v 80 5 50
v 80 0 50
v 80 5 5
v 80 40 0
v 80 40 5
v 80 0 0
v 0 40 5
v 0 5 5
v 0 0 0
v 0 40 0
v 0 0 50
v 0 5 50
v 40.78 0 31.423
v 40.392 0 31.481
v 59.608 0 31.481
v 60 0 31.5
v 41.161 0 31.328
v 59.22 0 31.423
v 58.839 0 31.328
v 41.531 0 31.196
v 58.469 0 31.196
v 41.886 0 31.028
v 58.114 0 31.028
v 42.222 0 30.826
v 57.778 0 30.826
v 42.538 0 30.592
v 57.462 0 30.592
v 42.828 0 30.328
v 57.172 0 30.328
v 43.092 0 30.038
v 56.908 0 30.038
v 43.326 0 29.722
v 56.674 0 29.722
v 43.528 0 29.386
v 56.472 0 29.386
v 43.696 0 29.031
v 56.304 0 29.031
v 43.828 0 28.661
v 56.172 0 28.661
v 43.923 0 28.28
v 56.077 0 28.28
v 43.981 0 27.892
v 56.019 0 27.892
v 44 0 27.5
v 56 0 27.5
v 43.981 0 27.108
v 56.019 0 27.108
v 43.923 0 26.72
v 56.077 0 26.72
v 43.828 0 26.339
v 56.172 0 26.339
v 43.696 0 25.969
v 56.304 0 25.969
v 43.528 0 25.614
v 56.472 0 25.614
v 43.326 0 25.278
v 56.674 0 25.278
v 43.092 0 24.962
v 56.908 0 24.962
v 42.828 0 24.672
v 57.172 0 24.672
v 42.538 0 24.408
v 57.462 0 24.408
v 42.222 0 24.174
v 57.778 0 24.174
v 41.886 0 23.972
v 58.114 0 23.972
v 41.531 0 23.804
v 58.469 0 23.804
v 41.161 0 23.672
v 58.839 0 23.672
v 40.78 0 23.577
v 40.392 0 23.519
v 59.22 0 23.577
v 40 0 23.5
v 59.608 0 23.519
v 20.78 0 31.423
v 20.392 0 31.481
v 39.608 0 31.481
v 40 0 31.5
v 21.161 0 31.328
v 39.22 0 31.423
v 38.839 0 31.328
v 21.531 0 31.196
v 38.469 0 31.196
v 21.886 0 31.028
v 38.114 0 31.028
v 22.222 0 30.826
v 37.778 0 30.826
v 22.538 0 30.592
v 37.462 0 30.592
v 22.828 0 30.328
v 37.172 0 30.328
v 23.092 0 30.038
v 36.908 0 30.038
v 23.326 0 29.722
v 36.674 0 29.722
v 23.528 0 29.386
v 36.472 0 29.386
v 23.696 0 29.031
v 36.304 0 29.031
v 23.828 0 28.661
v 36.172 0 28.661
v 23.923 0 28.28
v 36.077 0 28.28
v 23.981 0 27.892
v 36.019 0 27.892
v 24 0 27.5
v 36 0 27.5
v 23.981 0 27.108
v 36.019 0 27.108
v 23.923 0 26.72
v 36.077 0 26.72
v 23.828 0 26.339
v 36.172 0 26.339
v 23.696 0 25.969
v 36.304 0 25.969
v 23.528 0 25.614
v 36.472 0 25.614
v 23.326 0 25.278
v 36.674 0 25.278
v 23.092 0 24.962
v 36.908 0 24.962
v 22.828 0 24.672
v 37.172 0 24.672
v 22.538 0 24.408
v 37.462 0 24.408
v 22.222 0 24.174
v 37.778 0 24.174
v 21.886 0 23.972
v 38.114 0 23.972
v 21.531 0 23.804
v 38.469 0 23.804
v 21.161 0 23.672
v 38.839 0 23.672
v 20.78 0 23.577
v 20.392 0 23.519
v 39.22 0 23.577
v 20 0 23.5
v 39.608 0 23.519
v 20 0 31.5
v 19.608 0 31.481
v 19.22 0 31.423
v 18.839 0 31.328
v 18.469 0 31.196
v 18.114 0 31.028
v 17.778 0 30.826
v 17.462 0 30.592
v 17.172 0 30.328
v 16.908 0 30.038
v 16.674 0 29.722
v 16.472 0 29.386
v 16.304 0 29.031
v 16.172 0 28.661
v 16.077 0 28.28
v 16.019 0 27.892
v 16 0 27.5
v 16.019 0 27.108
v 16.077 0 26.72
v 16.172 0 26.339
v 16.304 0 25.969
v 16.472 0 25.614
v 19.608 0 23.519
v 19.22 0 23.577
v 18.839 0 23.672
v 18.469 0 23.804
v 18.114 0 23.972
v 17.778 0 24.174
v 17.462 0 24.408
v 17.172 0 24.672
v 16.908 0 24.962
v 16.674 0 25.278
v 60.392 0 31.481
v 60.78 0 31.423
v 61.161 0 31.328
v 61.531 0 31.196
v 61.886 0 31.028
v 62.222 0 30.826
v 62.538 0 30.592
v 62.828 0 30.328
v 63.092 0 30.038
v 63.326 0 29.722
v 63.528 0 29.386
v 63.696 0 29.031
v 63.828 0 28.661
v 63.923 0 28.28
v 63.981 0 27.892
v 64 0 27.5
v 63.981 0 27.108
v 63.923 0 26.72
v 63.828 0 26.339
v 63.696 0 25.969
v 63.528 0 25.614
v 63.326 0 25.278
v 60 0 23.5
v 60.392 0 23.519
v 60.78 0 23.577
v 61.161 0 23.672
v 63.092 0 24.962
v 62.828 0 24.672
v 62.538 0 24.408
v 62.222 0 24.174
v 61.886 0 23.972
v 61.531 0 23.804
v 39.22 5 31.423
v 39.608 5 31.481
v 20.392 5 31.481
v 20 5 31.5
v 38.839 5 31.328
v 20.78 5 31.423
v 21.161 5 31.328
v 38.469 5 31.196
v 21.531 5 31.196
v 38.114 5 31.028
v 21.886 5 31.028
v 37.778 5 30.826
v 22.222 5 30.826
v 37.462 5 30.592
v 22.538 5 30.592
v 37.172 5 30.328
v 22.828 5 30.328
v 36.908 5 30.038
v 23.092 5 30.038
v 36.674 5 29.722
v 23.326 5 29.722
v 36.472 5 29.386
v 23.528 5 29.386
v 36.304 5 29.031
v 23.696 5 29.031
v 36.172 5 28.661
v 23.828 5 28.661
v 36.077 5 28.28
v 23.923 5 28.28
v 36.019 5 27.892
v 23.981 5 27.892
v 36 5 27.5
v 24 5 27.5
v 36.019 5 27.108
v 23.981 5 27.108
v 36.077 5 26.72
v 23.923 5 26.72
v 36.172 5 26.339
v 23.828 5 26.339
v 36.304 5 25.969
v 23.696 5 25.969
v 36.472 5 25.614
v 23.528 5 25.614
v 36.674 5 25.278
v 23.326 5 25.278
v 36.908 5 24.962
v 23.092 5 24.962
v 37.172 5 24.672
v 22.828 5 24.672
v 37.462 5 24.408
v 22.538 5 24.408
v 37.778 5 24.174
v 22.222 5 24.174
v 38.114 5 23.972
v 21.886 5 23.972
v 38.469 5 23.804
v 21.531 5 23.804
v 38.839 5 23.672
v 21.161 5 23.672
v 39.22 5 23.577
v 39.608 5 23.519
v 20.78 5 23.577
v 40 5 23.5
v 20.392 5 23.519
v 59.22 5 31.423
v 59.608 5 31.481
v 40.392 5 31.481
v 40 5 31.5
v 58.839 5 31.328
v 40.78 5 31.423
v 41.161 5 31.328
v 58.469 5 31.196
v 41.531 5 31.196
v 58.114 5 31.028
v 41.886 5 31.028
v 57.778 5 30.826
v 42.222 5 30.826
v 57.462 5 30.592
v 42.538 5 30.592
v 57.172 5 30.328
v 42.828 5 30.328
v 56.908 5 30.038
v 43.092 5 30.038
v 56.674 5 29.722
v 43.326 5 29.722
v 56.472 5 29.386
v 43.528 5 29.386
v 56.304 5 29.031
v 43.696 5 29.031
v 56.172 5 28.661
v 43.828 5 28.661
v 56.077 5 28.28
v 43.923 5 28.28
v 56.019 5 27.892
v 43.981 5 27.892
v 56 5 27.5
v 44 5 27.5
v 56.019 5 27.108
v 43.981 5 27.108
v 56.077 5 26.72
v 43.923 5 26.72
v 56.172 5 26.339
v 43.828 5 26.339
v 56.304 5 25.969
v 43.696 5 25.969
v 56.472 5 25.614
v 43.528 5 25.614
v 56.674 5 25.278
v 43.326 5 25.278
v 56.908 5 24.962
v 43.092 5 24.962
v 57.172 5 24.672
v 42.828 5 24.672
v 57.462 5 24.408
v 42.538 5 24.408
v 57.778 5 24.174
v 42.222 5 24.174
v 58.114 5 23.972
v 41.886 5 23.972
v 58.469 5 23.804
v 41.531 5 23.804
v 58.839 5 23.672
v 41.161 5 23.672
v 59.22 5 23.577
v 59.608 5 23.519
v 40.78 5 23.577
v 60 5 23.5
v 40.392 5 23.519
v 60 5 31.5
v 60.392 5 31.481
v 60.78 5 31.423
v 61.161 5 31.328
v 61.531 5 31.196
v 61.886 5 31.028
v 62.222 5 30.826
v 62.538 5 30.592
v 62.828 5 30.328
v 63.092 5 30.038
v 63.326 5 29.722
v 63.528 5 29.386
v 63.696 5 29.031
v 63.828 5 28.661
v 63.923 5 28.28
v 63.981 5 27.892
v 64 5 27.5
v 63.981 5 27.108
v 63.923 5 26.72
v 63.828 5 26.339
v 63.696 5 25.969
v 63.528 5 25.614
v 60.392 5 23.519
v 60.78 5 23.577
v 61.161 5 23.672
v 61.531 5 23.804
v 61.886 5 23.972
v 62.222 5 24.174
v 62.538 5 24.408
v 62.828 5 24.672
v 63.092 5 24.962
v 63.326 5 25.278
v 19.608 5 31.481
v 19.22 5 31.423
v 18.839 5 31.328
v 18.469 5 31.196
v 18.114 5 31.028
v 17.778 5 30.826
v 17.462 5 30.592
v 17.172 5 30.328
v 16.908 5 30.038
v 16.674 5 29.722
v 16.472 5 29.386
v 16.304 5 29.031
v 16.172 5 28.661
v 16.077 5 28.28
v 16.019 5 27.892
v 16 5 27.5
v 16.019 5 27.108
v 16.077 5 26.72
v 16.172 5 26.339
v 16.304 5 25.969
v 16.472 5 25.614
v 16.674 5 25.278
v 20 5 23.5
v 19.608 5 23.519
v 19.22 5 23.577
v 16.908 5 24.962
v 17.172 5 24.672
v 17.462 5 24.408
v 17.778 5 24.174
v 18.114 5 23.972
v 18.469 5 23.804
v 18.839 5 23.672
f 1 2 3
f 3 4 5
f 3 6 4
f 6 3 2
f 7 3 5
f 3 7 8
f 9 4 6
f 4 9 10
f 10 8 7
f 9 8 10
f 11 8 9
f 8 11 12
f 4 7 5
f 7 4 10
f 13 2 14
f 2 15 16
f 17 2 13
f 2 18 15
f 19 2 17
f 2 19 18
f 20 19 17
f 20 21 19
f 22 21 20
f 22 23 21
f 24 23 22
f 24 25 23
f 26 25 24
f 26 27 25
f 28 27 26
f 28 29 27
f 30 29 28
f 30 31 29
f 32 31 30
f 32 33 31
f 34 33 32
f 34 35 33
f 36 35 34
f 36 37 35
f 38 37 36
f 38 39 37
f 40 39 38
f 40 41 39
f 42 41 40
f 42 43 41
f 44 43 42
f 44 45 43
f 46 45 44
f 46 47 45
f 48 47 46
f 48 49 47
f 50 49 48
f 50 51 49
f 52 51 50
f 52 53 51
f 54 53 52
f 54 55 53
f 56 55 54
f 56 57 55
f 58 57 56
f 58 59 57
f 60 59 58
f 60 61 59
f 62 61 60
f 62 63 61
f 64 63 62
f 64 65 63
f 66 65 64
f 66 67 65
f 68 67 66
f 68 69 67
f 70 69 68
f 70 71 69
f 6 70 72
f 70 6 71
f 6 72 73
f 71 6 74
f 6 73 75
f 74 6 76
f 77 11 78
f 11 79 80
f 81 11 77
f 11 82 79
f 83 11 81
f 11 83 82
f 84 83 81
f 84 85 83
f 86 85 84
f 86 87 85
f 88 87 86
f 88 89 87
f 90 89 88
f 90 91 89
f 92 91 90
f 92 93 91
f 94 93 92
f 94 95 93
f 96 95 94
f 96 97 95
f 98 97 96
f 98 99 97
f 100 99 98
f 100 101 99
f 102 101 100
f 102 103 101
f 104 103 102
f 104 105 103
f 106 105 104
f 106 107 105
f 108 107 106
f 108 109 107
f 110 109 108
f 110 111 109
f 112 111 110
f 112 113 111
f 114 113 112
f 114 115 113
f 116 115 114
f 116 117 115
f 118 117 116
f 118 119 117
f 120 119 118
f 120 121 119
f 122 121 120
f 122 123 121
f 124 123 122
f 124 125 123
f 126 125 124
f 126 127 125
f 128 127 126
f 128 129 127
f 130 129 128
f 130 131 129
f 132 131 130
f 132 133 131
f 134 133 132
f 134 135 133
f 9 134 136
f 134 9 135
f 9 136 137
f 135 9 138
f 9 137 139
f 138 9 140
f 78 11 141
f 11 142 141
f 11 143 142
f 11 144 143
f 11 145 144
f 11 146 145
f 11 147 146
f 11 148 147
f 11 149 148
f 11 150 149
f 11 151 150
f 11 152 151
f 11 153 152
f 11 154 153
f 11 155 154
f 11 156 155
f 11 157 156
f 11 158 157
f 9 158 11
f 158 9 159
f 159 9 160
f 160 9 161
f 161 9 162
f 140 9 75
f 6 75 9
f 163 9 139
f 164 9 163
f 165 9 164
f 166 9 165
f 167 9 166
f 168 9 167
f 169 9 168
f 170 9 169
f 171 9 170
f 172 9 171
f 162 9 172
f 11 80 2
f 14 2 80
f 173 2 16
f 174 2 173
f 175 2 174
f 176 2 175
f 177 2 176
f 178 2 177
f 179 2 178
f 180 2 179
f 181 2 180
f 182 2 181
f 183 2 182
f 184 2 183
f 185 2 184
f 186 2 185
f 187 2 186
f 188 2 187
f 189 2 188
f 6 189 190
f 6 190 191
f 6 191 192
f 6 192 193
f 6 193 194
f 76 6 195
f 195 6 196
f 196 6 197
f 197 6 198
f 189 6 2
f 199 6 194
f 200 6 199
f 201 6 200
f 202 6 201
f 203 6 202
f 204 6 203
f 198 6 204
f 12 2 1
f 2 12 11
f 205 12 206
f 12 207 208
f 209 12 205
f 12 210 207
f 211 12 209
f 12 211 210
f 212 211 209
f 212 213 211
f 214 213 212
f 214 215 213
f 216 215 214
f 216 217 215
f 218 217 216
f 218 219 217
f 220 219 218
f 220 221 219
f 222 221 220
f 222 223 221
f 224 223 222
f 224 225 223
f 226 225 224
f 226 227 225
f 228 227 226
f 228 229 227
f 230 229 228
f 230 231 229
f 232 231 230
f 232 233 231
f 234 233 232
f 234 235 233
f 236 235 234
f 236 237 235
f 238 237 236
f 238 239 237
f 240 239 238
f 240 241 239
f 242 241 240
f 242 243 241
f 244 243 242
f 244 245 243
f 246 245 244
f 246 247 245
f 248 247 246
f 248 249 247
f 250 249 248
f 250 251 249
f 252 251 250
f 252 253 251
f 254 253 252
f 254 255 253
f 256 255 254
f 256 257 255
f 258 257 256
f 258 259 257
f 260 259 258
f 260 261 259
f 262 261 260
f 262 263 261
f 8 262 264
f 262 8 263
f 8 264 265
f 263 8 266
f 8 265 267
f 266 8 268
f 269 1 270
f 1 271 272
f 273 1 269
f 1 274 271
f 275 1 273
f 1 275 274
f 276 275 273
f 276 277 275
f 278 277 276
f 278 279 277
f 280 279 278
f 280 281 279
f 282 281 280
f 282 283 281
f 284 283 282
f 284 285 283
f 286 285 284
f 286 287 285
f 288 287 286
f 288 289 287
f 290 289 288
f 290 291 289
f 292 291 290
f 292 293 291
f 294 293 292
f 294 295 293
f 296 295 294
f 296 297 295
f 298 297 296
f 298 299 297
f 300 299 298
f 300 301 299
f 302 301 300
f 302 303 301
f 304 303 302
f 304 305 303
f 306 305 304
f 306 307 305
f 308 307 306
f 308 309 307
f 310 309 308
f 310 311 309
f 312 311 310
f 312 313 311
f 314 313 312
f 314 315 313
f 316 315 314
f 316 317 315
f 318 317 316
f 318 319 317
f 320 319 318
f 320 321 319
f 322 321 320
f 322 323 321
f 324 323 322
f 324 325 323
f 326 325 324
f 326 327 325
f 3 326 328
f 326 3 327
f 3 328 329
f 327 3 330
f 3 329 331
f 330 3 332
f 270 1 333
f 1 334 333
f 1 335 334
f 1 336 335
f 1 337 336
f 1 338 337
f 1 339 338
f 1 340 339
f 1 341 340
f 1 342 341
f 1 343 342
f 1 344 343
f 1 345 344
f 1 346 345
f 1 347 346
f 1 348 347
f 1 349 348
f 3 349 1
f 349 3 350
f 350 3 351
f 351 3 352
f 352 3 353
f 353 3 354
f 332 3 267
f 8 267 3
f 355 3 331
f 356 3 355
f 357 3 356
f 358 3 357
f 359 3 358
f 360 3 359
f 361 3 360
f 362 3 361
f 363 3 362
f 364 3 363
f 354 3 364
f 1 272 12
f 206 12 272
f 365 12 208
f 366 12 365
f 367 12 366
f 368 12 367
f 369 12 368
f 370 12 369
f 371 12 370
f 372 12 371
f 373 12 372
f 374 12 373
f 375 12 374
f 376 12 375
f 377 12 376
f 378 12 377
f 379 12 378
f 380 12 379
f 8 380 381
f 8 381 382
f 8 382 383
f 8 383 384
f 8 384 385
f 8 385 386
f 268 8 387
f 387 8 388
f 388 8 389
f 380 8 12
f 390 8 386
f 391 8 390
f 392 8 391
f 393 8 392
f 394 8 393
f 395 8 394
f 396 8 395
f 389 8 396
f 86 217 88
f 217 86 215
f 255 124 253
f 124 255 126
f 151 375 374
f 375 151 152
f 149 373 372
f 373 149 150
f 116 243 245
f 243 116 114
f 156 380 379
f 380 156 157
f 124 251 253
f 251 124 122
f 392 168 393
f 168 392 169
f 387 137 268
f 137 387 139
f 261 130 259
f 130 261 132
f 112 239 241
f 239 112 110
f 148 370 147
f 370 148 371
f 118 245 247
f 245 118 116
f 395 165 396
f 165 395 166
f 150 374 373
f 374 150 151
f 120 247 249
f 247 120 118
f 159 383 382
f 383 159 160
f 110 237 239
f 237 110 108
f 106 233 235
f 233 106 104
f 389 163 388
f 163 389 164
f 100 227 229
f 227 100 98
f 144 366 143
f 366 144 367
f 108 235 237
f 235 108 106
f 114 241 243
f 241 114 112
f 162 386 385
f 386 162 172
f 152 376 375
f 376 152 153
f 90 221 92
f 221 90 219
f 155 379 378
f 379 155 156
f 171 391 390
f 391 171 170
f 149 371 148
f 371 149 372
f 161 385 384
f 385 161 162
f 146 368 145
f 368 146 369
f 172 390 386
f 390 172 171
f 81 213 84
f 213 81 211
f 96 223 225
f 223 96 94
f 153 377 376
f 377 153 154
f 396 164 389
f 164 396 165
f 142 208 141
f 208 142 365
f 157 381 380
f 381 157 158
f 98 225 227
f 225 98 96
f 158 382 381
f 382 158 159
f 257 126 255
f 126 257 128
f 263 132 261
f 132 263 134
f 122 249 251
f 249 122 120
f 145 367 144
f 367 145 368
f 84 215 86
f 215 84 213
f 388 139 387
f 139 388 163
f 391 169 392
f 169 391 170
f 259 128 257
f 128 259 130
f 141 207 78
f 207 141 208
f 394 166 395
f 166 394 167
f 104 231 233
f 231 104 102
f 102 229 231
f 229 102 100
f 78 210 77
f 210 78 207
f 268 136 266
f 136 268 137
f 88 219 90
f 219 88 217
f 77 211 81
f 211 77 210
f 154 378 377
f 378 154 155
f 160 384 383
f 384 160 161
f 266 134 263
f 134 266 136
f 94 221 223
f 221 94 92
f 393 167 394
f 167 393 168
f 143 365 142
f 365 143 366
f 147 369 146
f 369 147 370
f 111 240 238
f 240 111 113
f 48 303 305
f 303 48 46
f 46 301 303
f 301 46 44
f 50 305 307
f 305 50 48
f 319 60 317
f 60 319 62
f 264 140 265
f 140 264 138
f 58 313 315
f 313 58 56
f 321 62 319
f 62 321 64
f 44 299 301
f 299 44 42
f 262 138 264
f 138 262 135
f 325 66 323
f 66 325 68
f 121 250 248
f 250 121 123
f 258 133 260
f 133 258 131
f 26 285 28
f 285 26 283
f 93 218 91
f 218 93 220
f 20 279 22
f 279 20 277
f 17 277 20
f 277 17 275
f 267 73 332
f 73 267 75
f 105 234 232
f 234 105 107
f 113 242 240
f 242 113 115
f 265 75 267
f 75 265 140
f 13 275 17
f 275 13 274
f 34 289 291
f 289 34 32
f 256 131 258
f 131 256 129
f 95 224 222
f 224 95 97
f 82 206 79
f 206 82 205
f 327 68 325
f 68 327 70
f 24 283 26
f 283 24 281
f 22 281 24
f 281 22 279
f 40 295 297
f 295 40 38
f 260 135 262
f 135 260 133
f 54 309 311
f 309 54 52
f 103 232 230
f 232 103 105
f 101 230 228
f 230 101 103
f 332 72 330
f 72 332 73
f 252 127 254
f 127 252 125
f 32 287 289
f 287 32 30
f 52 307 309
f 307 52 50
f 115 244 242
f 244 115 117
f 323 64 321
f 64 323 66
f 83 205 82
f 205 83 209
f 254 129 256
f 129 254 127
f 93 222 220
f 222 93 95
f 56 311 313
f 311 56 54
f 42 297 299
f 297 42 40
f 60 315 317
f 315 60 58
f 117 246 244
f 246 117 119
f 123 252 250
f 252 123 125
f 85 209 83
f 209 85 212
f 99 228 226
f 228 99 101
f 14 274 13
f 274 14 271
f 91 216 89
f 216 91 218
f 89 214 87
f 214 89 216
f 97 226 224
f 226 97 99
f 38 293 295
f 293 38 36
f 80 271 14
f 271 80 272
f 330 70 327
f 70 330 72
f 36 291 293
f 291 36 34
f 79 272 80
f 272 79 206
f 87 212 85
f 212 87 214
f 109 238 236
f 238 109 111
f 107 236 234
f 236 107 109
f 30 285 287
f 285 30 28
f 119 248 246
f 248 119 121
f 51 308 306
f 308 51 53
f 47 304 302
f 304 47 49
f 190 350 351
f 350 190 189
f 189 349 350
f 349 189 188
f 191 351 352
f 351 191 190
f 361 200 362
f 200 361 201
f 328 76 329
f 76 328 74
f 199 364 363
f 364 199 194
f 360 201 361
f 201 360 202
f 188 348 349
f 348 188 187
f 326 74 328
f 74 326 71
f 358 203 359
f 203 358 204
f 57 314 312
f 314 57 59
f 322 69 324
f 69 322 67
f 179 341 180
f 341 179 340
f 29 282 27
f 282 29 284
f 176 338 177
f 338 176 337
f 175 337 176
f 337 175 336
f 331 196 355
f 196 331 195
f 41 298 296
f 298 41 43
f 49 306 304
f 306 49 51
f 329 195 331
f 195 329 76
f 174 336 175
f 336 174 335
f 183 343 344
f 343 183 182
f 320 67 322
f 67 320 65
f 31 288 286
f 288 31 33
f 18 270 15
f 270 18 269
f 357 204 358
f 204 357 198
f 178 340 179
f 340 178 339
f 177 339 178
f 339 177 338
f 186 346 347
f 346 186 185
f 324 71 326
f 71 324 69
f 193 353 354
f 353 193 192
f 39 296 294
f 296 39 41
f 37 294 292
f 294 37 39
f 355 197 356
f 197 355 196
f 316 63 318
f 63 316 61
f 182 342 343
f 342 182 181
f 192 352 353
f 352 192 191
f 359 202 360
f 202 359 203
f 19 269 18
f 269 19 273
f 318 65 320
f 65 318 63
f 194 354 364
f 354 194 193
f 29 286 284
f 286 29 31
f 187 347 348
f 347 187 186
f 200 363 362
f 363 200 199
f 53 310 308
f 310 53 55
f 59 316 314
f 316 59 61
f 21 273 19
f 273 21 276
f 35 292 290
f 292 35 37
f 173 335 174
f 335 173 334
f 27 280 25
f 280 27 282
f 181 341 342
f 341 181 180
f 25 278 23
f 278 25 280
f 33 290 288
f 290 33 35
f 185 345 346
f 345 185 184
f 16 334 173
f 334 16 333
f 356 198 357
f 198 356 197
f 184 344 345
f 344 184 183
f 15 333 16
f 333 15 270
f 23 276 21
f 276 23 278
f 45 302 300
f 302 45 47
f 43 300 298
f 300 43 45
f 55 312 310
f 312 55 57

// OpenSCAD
// fixture: reviewed L-bracket for the 007 case (issue #81 EV-4).
// The notes say 'L angle bracket with three wall holes'; the ink shows two
// independent rectangles (one with 3 holes). This is the reviewed
// interpretation: base wall + upright wall with 3 through-holes, sized to
// the GT extents 80x40x50. Compared against the model's own archived
// plate scad through the SAME projection path the product used.
$fn = 64;
difference() {
  union() {
    cube([80, 40, 5]);                 // base wall
    translate([0, 0, 5]) cube([80, 5, 45]);   // upright wall (total z 50)
  }
  for (x = [20, 40, 60])
    translate([x, -1, 27.5]) rotate([-90, 0, 0]) cylinder(d = 8, h = 7);
}
